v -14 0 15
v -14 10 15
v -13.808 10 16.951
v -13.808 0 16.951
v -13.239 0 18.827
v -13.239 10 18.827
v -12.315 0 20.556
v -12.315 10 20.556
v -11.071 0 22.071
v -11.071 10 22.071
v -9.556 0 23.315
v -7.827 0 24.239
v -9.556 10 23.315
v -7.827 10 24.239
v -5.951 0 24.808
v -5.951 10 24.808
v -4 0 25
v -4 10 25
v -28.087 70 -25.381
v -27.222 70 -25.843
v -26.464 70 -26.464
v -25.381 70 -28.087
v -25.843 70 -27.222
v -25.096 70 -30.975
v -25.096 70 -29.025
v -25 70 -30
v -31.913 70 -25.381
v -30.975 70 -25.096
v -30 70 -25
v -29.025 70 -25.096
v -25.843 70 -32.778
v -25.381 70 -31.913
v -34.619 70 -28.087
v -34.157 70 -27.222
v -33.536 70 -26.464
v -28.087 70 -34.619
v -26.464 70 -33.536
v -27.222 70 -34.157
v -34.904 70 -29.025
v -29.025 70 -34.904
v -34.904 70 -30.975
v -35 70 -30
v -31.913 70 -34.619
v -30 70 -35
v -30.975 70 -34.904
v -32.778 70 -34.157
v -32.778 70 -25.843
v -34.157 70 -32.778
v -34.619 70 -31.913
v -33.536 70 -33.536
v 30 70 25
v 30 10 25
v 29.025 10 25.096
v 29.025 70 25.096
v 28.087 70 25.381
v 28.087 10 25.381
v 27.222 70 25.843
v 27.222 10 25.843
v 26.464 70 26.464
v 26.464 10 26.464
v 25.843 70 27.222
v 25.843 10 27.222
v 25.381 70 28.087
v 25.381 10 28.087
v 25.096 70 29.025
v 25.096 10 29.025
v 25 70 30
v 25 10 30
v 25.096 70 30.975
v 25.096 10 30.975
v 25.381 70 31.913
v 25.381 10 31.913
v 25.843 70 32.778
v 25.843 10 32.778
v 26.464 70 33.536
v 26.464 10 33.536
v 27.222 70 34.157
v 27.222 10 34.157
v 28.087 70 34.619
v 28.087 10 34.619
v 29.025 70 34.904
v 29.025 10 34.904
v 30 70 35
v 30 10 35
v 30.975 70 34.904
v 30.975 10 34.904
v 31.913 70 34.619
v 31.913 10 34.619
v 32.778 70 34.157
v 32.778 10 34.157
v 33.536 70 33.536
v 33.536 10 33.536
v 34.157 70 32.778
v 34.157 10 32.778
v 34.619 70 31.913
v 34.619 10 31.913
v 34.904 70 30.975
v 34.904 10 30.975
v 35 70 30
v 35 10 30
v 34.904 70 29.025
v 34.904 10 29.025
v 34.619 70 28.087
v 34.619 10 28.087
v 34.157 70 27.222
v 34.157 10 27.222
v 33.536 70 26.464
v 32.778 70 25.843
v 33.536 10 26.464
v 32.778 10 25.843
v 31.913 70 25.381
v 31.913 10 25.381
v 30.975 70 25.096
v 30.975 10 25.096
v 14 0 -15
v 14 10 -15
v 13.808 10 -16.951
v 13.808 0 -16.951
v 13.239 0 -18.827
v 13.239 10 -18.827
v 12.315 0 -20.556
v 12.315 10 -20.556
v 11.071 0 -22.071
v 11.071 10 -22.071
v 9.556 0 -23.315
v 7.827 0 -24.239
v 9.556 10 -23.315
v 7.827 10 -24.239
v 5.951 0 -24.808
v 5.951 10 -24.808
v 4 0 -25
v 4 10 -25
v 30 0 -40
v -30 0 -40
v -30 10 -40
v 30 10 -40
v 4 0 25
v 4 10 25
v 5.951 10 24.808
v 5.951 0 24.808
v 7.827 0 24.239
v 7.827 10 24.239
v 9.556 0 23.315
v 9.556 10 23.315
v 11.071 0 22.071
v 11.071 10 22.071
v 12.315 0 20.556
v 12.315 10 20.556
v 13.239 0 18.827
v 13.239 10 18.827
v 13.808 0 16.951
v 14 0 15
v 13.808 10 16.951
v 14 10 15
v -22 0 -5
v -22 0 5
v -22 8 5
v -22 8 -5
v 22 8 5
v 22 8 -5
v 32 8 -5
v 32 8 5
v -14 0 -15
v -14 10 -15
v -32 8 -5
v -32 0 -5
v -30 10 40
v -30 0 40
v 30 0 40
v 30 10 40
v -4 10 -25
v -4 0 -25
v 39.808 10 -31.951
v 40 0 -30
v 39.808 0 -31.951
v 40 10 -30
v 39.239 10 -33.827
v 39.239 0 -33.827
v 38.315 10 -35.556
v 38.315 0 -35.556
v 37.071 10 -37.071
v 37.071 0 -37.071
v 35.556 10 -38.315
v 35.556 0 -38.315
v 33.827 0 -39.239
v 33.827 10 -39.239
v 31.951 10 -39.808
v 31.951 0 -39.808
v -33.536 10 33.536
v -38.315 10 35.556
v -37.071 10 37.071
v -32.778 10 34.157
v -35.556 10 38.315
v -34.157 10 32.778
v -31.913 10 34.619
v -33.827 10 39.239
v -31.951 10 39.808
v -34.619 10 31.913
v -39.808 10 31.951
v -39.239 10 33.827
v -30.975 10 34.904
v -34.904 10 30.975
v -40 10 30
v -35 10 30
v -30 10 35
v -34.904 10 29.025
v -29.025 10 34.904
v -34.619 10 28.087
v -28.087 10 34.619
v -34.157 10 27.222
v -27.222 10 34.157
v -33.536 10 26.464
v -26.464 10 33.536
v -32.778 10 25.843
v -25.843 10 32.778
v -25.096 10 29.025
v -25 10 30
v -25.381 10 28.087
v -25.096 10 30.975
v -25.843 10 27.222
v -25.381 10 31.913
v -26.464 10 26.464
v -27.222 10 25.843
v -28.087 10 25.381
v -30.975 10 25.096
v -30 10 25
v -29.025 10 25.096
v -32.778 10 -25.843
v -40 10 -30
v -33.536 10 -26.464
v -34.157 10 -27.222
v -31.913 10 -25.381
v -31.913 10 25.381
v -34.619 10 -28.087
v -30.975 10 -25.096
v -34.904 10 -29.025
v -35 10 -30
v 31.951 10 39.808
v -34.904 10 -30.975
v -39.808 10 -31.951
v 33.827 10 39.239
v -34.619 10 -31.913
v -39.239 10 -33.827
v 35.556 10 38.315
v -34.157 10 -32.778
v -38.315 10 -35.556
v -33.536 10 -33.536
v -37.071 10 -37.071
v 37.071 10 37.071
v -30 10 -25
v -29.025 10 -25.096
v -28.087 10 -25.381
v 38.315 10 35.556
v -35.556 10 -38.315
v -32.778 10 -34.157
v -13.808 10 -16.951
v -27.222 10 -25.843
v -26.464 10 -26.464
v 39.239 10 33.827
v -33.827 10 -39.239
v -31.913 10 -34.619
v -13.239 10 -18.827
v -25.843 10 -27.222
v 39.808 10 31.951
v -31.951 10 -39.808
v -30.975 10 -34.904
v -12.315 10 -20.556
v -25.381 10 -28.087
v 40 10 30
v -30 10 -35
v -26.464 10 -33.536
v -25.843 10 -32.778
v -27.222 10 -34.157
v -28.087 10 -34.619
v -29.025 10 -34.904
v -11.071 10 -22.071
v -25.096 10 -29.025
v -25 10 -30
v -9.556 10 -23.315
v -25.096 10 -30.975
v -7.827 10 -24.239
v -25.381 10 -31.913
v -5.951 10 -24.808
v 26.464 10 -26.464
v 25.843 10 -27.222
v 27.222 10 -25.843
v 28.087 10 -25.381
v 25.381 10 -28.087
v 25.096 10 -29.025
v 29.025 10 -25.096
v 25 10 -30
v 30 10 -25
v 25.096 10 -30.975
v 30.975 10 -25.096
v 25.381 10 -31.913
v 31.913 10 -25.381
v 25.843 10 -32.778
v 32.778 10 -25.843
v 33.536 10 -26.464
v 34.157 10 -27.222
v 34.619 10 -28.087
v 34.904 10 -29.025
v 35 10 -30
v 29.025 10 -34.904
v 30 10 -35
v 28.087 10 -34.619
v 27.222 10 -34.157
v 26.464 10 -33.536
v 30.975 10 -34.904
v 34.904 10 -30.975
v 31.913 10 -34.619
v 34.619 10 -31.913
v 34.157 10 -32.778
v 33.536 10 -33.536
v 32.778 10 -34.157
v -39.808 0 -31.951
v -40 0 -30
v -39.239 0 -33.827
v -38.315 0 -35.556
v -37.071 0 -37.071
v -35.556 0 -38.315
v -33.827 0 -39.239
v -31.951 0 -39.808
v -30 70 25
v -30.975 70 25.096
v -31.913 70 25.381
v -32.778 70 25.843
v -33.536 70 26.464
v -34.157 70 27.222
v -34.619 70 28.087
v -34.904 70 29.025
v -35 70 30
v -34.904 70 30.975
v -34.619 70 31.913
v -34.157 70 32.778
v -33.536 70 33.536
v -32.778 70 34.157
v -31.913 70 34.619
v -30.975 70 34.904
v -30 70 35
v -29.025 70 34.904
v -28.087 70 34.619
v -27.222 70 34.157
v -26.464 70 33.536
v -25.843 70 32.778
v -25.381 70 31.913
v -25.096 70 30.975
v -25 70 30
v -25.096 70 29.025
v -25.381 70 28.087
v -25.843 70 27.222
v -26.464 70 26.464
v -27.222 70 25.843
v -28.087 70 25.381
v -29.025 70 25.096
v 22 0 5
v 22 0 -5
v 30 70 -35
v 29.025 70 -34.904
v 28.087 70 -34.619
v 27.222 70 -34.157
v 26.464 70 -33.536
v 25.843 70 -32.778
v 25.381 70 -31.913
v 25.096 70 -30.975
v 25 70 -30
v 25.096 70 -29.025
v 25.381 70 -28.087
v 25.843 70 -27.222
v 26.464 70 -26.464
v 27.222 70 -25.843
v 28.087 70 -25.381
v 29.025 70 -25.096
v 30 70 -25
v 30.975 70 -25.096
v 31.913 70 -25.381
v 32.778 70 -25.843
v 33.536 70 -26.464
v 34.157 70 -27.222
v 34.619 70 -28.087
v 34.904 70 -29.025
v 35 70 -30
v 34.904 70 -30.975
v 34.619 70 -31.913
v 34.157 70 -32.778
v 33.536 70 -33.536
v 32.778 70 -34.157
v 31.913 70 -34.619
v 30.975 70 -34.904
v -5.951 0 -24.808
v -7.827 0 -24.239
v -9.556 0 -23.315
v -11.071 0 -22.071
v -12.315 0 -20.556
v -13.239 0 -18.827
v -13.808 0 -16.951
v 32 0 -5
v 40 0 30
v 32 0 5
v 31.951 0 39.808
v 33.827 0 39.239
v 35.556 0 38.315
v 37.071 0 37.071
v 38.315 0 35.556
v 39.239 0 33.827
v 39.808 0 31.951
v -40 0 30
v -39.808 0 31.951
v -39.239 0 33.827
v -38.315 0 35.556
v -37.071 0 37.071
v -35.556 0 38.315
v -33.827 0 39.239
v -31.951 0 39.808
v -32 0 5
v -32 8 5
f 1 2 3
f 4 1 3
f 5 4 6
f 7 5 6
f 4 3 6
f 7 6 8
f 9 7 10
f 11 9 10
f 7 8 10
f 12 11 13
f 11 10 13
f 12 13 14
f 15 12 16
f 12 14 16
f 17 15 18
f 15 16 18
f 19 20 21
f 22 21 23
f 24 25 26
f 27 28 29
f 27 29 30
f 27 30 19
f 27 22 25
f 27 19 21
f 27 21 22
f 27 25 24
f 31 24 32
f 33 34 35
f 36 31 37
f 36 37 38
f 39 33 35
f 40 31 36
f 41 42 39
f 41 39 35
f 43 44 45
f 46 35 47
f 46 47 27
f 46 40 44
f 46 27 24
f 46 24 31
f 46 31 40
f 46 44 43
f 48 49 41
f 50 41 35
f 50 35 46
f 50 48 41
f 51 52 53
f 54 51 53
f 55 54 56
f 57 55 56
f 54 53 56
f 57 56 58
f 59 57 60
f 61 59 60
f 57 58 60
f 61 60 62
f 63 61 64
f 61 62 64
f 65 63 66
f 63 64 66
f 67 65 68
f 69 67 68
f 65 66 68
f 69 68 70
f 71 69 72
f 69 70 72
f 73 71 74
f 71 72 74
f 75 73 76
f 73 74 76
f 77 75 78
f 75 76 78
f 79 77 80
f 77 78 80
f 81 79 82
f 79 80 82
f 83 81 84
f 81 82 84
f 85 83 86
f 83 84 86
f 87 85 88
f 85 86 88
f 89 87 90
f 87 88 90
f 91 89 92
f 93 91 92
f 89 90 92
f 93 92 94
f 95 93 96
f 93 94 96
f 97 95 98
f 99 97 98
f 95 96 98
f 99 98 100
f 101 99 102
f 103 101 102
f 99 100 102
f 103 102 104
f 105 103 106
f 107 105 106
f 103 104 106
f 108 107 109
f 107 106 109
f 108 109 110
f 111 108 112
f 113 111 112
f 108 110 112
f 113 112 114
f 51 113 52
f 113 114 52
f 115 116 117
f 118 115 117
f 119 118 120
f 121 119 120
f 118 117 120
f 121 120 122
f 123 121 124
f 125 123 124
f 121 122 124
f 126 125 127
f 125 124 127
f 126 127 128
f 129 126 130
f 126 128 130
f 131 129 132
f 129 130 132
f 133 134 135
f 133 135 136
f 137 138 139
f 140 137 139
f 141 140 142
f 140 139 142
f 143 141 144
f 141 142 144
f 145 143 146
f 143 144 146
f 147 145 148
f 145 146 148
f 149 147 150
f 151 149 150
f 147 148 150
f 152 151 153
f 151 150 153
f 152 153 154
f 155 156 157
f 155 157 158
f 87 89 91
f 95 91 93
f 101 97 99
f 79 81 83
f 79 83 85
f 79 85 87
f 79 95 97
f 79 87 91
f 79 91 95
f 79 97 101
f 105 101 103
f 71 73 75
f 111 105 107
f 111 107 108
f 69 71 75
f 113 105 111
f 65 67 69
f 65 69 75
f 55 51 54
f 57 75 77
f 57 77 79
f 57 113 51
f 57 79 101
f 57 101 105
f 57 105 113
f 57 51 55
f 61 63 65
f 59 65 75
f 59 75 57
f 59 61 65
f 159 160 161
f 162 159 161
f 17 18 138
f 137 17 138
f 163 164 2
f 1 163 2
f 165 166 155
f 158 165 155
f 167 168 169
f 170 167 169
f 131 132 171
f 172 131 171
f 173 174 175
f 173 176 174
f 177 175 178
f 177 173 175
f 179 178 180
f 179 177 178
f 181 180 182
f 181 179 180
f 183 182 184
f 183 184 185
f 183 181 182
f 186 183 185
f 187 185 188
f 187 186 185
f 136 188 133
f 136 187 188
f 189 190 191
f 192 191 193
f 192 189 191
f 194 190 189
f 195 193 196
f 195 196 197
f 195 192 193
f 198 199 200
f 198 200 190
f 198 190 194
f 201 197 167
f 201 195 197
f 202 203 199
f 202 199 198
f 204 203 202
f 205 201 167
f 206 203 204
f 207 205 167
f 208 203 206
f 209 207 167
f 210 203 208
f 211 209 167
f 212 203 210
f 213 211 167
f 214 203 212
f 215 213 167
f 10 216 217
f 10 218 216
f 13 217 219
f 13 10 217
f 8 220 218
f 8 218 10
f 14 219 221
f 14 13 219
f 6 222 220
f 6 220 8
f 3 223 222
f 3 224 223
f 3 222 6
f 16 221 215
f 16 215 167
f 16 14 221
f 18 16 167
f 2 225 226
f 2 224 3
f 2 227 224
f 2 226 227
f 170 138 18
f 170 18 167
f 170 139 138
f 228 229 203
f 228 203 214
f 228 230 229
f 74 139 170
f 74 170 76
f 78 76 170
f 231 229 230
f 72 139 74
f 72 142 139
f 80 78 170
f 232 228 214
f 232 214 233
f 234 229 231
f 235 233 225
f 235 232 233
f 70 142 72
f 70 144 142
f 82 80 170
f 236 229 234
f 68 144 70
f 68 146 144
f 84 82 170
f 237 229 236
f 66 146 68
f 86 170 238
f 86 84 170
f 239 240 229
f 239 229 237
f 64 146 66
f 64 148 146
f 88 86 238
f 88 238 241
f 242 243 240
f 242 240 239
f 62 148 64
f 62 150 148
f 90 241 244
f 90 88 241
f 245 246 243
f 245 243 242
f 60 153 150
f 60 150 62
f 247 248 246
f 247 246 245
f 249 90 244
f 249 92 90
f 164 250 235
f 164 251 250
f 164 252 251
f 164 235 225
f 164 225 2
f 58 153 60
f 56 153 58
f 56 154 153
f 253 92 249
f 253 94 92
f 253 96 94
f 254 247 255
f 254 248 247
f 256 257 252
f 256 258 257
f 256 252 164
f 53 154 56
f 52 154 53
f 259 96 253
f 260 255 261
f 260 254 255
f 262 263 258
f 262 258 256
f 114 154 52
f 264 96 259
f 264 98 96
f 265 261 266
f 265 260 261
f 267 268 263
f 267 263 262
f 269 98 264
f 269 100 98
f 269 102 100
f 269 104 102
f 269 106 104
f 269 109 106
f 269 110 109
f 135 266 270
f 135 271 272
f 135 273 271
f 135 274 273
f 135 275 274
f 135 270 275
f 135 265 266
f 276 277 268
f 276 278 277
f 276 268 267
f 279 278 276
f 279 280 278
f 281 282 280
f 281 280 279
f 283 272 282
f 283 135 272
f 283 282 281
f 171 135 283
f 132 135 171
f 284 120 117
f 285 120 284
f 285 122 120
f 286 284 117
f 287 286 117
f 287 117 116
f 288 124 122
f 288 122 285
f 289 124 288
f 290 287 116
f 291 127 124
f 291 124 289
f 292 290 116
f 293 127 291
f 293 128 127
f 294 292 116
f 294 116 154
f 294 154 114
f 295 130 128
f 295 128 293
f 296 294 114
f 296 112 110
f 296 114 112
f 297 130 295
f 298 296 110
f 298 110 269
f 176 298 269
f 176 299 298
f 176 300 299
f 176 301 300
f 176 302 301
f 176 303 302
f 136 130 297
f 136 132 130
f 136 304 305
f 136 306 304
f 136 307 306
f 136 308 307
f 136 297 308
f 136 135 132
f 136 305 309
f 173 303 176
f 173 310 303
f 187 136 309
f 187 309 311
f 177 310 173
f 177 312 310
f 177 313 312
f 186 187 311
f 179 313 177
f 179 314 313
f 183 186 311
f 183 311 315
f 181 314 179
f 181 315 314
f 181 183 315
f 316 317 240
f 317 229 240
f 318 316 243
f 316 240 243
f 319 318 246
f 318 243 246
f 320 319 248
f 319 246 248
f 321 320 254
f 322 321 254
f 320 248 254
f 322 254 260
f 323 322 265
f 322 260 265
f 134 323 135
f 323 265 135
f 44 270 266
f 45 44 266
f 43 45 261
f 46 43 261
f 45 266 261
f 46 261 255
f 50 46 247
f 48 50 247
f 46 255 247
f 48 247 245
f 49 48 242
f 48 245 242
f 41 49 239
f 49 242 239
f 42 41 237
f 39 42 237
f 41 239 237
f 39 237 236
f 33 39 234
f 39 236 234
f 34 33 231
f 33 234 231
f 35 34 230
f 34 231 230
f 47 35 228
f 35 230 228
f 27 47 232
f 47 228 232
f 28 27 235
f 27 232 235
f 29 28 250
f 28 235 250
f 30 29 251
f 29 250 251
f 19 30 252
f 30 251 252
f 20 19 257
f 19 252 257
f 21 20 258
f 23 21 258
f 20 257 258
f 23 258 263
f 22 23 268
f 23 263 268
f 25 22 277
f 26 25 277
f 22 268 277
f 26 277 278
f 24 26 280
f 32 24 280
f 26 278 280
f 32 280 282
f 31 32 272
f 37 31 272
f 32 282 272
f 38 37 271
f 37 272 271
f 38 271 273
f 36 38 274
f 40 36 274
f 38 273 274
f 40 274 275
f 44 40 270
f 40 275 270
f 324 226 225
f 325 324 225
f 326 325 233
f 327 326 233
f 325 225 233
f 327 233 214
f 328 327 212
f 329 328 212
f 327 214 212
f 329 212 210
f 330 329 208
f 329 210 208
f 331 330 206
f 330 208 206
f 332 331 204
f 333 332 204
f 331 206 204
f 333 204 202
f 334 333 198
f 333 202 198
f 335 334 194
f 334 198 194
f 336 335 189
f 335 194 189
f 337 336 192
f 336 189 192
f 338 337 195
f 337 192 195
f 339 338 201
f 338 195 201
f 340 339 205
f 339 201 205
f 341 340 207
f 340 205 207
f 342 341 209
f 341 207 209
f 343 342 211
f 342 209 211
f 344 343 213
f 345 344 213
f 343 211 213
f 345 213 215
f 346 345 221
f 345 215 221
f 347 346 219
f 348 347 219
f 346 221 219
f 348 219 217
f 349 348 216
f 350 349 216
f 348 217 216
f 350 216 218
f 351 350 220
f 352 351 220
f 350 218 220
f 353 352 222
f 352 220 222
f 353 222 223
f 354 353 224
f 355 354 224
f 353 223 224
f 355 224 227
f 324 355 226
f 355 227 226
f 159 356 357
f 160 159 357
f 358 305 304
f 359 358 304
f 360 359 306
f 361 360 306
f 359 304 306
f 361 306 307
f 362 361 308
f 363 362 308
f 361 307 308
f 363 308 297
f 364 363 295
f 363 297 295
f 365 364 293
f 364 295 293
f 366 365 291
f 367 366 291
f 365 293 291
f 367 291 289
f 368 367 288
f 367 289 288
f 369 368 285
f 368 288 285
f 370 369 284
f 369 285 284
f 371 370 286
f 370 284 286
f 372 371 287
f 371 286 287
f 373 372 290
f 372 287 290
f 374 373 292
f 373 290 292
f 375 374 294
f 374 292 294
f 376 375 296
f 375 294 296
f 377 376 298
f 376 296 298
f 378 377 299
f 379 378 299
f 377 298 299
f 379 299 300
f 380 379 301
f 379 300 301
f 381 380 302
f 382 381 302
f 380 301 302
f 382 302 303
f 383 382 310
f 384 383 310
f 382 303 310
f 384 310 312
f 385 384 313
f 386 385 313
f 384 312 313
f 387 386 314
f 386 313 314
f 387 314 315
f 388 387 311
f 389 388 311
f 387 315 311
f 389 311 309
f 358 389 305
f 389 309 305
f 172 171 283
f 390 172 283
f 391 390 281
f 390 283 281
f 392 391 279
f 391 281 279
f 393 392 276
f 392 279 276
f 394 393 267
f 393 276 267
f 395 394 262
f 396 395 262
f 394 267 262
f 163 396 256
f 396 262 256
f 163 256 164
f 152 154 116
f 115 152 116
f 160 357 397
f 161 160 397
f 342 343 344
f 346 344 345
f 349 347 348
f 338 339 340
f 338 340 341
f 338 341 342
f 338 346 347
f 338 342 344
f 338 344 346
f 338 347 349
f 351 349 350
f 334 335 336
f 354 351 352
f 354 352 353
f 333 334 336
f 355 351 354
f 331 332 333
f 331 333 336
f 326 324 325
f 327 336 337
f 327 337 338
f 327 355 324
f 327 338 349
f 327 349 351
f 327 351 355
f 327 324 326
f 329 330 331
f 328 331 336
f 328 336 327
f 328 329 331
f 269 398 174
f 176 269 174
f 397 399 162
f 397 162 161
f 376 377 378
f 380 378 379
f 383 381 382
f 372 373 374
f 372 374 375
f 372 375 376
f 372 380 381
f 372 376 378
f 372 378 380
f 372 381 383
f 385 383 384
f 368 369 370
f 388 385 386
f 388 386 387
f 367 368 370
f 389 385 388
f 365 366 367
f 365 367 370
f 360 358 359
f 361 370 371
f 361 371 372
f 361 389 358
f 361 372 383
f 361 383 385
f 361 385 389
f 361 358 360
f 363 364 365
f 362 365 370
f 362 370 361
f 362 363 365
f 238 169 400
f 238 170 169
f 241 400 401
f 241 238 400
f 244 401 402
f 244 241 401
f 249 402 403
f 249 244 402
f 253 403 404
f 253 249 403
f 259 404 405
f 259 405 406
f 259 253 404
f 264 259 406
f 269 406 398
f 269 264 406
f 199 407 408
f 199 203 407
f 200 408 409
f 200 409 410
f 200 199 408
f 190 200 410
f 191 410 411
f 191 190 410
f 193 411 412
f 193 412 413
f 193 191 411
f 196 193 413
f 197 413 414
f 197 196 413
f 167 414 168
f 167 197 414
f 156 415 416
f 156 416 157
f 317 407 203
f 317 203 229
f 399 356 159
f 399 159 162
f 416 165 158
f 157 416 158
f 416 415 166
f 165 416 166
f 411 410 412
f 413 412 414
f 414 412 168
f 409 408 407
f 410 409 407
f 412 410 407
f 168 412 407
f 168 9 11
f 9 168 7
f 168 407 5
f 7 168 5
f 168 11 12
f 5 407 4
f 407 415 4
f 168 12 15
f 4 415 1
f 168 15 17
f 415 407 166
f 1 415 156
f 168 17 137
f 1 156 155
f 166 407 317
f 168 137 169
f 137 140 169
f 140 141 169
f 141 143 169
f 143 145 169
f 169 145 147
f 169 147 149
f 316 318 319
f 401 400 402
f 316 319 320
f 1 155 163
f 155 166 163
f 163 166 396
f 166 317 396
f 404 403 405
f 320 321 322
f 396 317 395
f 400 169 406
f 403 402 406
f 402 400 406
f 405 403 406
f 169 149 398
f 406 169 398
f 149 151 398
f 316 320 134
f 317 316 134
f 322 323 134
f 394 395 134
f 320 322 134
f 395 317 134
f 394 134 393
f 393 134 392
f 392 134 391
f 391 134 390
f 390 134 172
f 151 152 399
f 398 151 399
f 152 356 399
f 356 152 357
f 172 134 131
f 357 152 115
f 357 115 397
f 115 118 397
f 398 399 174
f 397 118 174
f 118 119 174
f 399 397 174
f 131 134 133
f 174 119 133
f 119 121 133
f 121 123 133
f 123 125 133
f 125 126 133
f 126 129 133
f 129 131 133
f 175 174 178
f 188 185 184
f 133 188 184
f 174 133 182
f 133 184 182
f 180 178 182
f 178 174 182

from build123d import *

# Parameters (mm, degrees)
SKETCH_1_W          = 80
SKETCH_1_H          = 80
EXTRUDE_1_DEPTH     = 10
FILLET_1_R          = 10
SKETCH_2_W          = 10
SKETCH_2_H          = 10
CUT_EXTRUDE_1_DEPTH = 8
CUT_EXTRUDE_2_DEPTH = 58.445626465
SKETCH_4_R          = 5
EXTRUDE_2_DEPTH     = 60


with BuildPart() as part:
    # ｽｹｯﾁ1 → ﾎﾞｽ - 押し出し1 (new body)
    with BuildSketch(Plane(origin=(0, 0, 0), x_dir=(1, 0, 0), z_dir=(0, 1, 0))):
        Rectangle(SKETCH_1_W, SKETCH_1_H)
    extrude(amount=EXTRUDE_1_DEPTH)

    # ﾌｨﾚｯﾄ1
    fillet_1_edges = [part.edges().sort_by_distance(p)[0] for p in [
        (40, 5, 40),
        (-40, 5, 40),
        (-40, 5, -40),
        (40, 5, -40),
    ]]
    fillet(fillet_1_edges, radius=FILLET_1_R)

    # ｽｹｯﾁ2 → ｶｯﾄ - 押し出し1 (cut)
    with BuildSketch(Plane(origin=(0, 0, 0), x_dir=(1, 0, 0), z_dir=(0, 1, 0))):
        with Locations((-27, 0)):
            Rectangle(SKETCH_2_W, SKETCH_2_H)
        with Locations((27, 0)):
            Rectangle(SKETCH_2_W, SKETCH_2_H)
    extrude(amount=CUT_EXTRUDE_1_DEPTH, mode=Mode.SUBTRACT)

    # ｽｹｯﾁ3 → ｶｯﾄ - 押し出し2 (cut, through all)
    with BuildSketch(Plane(origin=(0, 10, 0), x_dir=(1, 0, 0), z_dir=(0, 1, 0))):
        with BuildLine():
            Line((-4, -25), (4, -25))
            ThreePointArc((4, -25), (11.071067812, -22.071067812), (14, -15))
            Line((14, -15), (14, 15))
            ThreePointArc((14, 15), (11.071067812, 22.071067812), (4, 25))
            Line((4, 25), (-4, 25))
            ThreePointArc((-4, 25), (-11.071067812, 22.071067812), (-14, 15))
            Line((-14, 15), (-14, -15))
            ThreePointArc((-14, -15), (-11.071067812, -22.071067812), (-4, -25))
        make_face()
    extrude(amount=-CUT_EXTRUDE_2_DEPTH, mode=Mode.SUBTRACT)

    # ｽｹｯﾁ4 → ﾎﾞｽ - 押し出し2 (add)
    with BuildSketch(Plane(origin=(0, 10, 0), x_dir=(1, 0, 0), z_dir=(0, 1, 0))):
        with Locations(Location((-30, 30, 0), (0, 0, 90))):
            Circle(SKETCH_4_R)
        with Locations(Location((30, 30, 0), (0, 0, 90))):
            Circle(SKETCH_4_R)
        with Locations(Location((-30, -30, 0), (0, 0, 90))):
            Circle(SKETCH_4_R)
        with Locations(Location((30, -30, 0), (0, 0, 90))):
            Circle(SKETCH_4_R)
    extrude(amount=EXTRUDE_2_DEPTH)


solid = part.part
